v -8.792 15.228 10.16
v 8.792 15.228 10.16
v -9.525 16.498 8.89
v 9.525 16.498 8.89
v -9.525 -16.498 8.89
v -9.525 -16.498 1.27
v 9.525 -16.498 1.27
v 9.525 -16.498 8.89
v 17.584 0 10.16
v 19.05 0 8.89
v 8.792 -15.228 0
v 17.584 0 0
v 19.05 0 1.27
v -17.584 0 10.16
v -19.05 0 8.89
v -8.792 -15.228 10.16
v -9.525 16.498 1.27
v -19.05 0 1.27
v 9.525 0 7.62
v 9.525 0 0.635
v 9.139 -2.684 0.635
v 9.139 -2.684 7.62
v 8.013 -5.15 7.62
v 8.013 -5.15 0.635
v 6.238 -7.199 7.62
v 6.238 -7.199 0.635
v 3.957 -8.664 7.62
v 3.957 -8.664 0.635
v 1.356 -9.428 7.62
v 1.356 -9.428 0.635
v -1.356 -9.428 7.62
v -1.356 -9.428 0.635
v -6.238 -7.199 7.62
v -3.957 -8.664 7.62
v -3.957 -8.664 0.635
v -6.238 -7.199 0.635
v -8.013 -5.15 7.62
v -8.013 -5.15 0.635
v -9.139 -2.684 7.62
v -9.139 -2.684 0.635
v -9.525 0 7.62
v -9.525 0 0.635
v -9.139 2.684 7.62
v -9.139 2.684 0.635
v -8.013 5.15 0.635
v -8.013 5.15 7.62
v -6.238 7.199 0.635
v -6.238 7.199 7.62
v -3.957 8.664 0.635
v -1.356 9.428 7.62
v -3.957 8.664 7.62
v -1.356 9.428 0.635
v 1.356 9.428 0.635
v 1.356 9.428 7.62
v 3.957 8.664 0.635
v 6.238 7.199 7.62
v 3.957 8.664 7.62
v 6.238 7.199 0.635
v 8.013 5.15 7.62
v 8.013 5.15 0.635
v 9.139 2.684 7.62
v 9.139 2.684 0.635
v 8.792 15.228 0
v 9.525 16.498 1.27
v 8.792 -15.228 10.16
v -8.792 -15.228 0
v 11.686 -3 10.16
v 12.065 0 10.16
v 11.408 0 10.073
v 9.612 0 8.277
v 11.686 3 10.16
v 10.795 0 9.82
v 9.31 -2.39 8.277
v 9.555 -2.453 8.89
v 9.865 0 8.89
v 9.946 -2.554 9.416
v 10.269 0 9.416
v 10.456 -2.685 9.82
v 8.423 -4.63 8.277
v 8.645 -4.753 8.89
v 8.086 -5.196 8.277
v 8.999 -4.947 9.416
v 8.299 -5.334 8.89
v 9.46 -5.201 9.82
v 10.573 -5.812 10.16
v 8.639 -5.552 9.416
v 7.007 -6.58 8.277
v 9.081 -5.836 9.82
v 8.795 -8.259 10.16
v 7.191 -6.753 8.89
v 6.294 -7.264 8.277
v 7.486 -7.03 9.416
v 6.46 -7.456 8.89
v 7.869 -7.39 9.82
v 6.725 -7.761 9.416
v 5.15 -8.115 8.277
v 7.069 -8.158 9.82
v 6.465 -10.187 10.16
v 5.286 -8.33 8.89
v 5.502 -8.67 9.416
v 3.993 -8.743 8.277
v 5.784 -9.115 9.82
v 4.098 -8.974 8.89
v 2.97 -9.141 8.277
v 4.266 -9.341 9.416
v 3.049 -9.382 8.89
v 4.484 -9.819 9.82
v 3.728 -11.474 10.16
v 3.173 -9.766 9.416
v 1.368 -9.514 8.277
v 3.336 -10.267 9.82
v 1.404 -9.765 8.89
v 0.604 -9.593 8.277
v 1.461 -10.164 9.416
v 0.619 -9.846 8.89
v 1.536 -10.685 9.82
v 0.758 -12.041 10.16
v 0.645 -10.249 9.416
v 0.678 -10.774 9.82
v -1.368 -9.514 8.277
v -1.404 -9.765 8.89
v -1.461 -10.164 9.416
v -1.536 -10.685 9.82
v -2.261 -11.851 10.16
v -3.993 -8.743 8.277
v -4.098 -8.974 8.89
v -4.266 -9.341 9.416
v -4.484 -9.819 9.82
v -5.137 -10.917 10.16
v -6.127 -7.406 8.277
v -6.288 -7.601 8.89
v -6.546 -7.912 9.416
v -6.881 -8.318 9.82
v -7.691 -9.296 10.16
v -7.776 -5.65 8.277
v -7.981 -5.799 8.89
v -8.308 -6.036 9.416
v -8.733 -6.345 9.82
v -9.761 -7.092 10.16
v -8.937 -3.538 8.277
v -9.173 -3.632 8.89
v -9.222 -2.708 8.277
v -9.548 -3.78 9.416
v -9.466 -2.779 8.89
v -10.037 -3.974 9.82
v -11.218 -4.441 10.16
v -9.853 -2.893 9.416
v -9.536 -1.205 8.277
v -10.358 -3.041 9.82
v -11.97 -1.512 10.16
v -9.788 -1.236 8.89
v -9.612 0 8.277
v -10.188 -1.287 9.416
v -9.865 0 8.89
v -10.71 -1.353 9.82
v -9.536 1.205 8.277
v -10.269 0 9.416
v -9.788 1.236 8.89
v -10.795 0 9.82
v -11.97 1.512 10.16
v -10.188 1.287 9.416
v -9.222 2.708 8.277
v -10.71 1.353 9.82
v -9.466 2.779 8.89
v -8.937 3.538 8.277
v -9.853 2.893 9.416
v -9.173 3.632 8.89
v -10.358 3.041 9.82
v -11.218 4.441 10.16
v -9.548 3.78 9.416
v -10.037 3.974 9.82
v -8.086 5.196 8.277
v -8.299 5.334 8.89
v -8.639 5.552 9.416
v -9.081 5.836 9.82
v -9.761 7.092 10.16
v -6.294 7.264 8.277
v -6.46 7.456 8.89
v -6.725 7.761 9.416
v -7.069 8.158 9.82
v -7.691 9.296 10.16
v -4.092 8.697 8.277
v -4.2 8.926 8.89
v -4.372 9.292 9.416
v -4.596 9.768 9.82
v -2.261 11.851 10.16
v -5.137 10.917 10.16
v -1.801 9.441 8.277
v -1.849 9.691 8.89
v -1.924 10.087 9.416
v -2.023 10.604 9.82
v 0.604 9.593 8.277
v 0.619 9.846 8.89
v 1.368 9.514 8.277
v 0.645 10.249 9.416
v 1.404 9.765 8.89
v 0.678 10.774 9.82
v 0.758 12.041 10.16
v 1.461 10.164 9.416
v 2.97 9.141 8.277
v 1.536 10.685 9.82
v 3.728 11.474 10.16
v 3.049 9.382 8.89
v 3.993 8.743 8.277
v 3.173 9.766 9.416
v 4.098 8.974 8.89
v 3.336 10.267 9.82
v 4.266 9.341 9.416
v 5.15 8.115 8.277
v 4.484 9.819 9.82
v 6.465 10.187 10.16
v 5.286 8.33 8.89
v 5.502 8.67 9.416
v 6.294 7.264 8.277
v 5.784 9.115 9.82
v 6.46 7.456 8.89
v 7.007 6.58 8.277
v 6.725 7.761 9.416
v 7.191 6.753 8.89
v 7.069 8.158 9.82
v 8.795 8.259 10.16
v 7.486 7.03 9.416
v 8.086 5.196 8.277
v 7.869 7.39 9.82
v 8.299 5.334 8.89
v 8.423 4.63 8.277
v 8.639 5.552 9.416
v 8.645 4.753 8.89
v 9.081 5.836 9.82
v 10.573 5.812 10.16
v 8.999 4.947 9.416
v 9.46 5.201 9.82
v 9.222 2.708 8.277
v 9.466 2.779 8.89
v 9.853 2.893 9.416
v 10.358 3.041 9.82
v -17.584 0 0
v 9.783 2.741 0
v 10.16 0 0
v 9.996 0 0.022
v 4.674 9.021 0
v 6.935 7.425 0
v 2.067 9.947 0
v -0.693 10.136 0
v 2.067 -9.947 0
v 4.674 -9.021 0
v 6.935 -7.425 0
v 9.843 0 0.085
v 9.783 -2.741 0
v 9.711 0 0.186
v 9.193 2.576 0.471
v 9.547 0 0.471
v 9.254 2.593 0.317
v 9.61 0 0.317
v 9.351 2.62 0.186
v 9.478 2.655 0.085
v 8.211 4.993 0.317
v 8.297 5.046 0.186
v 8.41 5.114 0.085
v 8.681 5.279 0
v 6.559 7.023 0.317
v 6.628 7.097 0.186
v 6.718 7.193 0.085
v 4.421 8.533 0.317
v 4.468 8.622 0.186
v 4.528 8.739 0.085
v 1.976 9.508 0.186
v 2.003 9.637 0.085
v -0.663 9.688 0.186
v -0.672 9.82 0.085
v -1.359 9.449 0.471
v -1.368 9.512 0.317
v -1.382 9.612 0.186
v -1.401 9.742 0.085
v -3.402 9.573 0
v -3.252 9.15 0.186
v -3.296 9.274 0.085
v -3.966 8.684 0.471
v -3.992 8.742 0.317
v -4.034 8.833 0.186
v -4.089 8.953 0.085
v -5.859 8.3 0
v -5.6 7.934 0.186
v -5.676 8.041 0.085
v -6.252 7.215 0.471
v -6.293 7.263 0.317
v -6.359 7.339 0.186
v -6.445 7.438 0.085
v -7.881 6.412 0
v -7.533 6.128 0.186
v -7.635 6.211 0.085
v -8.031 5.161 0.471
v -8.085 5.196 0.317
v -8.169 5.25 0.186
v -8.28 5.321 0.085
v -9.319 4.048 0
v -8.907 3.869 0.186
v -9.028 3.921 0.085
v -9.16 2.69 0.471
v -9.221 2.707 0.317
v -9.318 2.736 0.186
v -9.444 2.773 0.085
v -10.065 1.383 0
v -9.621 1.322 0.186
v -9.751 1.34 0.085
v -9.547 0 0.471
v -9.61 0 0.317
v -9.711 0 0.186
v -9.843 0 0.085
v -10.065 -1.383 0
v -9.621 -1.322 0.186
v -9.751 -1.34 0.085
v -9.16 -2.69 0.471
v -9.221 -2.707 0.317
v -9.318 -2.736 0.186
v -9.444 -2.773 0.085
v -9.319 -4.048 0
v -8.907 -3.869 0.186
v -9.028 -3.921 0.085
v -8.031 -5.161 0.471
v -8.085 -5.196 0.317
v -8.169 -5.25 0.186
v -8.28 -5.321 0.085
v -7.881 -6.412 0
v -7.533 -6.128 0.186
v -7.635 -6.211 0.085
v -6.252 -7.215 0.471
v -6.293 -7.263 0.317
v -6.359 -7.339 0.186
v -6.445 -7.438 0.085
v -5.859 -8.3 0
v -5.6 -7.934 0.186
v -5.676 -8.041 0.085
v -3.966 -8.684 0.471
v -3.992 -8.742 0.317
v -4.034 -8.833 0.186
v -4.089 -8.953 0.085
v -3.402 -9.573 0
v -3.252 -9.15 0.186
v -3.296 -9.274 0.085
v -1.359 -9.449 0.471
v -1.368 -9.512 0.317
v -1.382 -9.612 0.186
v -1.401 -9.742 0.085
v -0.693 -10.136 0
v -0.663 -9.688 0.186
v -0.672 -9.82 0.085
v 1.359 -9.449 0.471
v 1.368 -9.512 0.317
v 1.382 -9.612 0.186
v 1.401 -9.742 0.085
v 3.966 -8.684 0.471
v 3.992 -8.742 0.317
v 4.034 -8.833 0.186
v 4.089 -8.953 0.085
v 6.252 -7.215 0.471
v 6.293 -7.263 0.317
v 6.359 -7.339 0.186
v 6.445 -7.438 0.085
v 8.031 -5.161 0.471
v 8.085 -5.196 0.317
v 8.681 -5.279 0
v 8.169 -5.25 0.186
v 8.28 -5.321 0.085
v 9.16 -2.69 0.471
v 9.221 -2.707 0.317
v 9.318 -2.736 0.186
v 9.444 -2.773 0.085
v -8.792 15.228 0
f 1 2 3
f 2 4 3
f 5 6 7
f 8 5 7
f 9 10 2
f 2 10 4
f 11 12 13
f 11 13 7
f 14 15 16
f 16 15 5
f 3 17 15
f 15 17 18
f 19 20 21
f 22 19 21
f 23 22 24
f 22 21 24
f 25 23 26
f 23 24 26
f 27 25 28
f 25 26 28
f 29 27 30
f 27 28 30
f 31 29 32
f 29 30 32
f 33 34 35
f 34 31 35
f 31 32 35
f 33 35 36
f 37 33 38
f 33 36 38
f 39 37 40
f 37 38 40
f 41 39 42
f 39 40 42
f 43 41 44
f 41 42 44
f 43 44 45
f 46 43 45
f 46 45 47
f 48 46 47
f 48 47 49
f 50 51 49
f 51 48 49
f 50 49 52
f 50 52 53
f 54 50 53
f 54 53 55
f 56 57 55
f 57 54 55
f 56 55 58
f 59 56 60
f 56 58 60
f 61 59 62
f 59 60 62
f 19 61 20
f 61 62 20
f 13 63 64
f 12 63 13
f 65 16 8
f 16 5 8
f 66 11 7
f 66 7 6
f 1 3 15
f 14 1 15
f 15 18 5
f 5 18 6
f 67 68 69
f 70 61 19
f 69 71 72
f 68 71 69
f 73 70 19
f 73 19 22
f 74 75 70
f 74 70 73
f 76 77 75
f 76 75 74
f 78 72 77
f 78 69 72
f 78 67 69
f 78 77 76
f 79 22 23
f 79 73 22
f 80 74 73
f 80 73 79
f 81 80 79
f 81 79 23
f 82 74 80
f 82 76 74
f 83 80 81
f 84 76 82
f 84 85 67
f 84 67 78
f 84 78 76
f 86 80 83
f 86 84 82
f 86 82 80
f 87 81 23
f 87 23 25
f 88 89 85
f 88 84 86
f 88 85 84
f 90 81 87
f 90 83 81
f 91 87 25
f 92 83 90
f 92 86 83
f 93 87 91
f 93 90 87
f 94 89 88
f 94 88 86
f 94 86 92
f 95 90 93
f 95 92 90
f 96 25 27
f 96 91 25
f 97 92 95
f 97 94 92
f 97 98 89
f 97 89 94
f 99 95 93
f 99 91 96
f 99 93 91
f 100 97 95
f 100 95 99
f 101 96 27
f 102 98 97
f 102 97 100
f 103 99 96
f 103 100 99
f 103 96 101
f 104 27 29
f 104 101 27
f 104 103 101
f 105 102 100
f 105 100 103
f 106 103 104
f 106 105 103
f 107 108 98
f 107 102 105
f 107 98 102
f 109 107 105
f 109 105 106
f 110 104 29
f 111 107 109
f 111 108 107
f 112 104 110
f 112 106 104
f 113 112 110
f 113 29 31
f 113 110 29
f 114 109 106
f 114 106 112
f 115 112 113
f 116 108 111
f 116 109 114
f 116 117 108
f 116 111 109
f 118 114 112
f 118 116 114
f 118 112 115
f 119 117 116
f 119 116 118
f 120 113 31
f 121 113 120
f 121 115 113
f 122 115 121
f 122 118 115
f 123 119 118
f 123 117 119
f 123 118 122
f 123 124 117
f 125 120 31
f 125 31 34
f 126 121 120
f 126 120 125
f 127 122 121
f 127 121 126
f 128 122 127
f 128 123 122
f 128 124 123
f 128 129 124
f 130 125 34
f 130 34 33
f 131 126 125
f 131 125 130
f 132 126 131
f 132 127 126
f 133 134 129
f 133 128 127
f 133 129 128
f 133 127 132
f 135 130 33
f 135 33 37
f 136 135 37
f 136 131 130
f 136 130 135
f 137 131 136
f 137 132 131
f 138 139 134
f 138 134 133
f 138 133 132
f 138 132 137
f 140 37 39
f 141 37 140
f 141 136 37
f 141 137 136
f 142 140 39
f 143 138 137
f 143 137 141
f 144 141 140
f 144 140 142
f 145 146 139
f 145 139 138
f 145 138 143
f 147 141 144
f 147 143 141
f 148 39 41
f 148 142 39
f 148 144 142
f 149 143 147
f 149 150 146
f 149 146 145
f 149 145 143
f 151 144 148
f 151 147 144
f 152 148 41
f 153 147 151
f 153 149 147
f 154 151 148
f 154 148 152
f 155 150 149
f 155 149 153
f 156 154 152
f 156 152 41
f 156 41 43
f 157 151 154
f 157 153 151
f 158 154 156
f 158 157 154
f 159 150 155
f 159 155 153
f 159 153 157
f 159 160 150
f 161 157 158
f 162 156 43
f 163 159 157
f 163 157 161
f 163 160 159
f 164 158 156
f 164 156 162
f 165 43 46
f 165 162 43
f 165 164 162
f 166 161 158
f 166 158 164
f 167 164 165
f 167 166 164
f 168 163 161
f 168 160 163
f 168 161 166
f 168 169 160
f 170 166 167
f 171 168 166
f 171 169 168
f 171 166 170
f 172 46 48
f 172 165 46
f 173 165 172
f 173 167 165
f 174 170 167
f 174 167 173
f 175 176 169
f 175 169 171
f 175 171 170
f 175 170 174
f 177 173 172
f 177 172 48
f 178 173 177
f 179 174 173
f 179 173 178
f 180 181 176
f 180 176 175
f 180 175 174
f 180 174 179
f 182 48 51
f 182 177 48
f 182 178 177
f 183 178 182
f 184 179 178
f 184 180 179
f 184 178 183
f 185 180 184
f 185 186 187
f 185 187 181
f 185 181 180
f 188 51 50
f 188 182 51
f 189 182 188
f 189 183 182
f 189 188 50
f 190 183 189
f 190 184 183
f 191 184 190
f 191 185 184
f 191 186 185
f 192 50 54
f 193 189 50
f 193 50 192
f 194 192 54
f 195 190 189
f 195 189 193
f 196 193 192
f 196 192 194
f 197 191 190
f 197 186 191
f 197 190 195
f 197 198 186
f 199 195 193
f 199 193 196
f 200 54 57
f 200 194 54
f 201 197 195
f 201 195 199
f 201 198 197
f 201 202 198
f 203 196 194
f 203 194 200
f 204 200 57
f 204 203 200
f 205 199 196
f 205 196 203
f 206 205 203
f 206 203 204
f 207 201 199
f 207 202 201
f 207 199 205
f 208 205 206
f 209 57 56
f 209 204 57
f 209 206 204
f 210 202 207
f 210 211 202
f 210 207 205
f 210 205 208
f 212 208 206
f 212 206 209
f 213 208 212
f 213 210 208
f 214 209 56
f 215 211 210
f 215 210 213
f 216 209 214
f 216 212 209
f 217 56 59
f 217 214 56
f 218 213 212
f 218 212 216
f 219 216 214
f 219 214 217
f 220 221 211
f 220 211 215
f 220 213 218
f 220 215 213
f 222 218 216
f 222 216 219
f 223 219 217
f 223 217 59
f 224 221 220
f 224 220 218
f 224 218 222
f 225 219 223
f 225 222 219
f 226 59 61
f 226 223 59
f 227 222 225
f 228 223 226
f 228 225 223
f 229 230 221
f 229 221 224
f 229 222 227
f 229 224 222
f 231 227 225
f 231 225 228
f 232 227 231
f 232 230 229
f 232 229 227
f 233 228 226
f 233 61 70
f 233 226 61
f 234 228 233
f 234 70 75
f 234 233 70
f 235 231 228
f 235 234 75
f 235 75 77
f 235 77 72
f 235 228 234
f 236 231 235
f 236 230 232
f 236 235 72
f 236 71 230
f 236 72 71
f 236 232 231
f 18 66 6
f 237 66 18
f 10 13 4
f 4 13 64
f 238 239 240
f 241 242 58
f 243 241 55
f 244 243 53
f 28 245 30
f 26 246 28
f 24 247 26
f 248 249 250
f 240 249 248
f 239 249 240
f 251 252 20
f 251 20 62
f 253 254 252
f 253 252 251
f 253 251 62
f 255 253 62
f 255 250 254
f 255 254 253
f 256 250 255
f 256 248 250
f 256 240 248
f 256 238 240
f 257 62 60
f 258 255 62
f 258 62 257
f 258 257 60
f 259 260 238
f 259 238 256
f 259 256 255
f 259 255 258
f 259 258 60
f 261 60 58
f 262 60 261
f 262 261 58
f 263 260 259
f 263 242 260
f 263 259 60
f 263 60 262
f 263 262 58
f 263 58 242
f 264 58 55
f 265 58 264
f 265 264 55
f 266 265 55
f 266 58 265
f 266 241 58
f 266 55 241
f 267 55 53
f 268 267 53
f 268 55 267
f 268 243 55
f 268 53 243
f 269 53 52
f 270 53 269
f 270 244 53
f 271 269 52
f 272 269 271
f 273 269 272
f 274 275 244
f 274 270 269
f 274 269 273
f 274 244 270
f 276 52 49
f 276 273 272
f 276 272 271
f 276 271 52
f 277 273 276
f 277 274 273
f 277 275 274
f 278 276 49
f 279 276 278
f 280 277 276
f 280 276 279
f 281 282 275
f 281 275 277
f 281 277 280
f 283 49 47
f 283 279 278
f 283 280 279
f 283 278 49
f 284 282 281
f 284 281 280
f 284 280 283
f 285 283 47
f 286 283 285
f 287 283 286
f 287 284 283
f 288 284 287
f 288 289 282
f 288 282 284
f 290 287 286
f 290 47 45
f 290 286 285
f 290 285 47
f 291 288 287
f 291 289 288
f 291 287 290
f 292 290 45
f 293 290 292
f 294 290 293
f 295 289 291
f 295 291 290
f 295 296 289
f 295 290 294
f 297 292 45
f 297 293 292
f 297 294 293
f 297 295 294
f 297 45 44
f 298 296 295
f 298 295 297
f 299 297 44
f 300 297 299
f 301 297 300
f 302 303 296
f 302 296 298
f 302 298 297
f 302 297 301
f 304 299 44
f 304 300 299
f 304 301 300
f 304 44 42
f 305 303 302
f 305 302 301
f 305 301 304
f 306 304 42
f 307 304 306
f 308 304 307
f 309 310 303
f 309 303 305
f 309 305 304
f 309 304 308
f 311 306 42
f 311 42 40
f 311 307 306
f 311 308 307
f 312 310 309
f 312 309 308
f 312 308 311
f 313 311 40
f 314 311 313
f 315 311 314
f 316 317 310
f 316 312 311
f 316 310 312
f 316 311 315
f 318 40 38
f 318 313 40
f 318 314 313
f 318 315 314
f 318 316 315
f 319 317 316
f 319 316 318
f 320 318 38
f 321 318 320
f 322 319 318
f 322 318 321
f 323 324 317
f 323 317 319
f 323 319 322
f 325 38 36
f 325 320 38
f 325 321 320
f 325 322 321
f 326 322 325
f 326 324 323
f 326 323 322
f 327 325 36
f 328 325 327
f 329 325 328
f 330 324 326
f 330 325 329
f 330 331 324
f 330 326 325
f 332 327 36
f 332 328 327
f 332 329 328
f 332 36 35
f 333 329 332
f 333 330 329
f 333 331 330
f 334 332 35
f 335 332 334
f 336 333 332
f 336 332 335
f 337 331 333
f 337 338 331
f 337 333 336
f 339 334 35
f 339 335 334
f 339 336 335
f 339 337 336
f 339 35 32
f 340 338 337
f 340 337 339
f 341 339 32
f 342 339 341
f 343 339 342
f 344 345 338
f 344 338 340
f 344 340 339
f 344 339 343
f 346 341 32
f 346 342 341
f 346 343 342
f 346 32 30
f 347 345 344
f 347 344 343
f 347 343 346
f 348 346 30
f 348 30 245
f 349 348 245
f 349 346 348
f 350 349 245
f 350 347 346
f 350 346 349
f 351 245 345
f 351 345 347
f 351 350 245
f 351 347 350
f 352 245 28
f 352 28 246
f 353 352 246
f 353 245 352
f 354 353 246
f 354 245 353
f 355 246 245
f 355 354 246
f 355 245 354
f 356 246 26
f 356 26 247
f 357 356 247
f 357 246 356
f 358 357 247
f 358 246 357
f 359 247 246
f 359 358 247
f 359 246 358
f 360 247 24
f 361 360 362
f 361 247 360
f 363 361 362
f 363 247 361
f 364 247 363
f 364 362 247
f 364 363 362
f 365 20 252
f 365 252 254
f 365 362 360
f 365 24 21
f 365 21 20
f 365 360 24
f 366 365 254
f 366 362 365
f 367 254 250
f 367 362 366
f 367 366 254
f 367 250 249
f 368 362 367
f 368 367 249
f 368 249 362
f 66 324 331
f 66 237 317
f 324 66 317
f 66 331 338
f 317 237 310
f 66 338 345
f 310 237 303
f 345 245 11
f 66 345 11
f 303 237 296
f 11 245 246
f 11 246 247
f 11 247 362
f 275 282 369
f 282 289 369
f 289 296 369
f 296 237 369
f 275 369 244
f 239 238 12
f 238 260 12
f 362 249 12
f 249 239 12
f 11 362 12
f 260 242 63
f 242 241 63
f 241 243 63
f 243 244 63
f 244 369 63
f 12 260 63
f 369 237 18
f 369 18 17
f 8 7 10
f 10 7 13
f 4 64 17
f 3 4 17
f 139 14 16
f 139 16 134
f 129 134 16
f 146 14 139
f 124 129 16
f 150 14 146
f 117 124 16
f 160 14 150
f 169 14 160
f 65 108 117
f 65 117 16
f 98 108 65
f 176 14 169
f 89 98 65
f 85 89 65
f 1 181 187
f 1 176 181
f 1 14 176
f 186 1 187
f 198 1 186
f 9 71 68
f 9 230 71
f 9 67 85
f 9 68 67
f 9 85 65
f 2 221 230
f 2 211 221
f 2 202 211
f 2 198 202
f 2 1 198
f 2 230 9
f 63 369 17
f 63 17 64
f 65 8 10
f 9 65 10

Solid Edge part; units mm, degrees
sketch "Sketch1" plane through (0, 0, 0) normal (0, 0, 1) x (1, 0, 0)
  line L0 (-19.05, 0) -> (-9.525, -16.4978)
  line L1 (-9.525, -16.4978) -> (9.525, -16.4978)
  line L2 (9.525, -16.4978) -> (19.05, 0)
  line L3 (19.05, 0) -> (9.525, 16.4978)
  line L4 (9.525, 16.4978) -> (-9.525, 16.4978)
  line L5 (-9.525, 16.4978) -> (-19.05, 0)
  circle A0 centre (0, 0) radius 9.525
extrude "Protrusion1" add sketch "Sketch1" along normal blind 10.16
fillet "Round_1" radius 2.54 1 edges at (-9.525, 0, 10.16)
fillet "Round1" radius 0.635 1 edges at (-9.525, 0, 0)
chamfer "Chamfer_3" distance 1.27 angle 45 6 edges at (14.2875, 8.2489, 10.16) (14.2875, -8.2489, 10.16) (0, -16.4978, 10.16) (-14.2875, -8.2489, 10.16) (-14.2875, 8.2489, 10.16) (0, 16.4978, 10.16)
chamfer "Chamfer1" distance 1.27 angle 45 6 edges at (14.2875, -8.2489, 0) (0, -16.4978, 0) (-14.2875, -8.2489, 0) (-14.2875, 8.2489, 0) (0, 16.4978, 0) (14.2875, 8.2489, 0)
